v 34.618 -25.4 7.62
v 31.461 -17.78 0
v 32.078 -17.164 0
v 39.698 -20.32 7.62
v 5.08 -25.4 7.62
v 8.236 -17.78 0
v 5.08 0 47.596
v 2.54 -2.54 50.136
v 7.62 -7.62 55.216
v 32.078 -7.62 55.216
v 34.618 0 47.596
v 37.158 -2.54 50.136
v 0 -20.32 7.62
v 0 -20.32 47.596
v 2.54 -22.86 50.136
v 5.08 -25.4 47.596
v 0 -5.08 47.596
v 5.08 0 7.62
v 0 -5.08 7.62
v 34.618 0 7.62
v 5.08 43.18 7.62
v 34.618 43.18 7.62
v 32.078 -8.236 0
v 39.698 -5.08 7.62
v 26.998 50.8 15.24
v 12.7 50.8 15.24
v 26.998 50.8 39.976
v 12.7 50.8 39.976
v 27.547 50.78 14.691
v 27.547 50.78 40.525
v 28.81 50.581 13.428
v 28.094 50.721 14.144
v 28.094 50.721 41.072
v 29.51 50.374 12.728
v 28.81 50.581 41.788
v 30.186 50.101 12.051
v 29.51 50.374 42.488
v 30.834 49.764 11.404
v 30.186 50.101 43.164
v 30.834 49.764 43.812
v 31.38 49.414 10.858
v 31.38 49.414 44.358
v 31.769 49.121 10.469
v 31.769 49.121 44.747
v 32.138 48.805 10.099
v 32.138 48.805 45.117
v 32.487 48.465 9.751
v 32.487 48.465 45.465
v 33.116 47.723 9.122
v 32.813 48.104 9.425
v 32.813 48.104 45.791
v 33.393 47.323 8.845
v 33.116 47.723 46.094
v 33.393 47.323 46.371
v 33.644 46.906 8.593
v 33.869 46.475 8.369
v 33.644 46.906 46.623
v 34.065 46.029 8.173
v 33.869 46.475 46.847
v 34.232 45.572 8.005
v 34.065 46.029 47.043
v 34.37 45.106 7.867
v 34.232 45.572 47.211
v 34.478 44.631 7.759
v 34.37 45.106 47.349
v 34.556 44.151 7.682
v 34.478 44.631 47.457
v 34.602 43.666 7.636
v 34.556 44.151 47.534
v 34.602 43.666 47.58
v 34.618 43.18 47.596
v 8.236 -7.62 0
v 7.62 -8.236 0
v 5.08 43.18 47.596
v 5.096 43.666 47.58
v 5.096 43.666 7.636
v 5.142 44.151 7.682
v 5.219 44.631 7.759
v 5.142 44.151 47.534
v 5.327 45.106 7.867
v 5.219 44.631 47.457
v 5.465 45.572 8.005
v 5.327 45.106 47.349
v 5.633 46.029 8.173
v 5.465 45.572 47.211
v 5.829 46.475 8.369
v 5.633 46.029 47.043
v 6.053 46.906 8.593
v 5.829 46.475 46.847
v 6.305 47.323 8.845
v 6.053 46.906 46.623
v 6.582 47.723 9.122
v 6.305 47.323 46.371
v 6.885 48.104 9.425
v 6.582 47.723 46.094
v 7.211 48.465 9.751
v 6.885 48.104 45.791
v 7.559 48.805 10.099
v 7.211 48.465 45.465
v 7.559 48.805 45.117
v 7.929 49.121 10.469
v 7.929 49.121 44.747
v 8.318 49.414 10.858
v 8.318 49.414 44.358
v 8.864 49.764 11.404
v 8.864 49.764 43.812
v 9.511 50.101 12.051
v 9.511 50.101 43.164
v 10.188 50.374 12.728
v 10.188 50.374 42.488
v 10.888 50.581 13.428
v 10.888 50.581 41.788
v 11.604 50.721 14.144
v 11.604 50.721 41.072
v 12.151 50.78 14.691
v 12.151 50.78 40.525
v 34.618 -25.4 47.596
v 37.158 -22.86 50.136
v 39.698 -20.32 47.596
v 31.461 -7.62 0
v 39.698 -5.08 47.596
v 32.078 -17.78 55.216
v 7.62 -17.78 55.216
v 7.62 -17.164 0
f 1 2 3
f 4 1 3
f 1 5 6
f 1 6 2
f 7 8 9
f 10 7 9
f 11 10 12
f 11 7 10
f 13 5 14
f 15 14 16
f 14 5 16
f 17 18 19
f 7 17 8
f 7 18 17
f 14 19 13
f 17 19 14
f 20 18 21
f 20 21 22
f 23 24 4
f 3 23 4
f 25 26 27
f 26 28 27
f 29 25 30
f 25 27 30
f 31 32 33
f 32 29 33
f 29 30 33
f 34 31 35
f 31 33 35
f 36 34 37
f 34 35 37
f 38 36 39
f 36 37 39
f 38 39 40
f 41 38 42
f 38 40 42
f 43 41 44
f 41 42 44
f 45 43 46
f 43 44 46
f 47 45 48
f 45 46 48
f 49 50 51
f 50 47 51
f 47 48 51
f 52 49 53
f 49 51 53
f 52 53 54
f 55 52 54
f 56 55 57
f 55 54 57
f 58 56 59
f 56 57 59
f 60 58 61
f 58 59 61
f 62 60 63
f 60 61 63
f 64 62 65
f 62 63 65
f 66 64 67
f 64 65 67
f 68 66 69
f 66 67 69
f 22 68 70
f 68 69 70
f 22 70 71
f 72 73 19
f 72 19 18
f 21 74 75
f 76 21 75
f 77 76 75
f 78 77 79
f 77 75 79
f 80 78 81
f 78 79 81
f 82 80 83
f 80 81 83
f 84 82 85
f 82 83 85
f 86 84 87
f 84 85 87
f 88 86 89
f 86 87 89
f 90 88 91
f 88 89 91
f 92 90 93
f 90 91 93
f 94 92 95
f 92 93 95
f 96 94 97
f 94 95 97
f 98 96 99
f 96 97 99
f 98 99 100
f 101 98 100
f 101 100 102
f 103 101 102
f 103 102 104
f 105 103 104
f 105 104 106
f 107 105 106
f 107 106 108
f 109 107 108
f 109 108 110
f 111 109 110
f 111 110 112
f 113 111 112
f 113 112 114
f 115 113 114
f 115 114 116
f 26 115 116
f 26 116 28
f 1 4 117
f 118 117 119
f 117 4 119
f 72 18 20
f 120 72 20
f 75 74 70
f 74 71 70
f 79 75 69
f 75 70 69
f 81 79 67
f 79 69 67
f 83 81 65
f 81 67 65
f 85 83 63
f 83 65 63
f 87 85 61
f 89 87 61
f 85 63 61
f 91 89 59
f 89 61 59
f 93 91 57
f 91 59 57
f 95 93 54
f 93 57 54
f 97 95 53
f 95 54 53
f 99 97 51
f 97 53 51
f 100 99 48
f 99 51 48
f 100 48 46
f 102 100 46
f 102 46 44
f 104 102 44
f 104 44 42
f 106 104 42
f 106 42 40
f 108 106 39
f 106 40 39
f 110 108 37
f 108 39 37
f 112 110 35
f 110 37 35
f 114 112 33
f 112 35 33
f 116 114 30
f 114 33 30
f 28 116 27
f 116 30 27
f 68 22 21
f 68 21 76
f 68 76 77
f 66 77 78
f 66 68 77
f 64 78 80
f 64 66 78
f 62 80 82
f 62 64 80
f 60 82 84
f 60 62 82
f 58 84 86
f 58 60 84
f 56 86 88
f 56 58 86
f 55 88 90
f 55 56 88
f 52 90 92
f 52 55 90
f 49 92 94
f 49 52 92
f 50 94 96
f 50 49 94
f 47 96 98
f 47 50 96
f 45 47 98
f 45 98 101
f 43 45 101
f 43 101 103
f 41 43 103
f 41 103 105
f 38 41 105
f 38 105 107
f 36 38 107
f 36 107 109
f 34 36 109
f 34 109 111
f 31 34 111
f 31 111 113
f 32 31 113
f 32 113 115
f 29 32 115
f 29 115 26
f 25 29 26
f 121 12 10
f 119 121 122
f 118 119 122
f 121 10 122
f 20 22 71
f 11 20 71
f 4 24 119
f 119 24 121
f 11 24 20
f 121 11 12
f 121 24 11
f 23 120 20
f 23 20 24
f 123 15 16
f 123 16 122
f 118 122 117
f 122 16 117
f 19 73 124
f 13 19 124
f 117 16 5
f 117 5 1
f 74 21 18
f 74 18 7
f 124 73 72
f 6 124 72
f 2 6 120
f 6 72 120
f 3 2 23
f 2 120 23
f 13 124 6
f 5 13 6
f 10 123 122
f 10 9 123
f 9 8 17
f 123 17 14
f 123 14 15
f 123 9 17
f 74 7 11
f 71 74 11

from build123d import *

# Parameters (mm, degrees)
F0_W     = 39.6977961063
F0_H     = 55.2159845829
F1_DEPTH = 25.4
F2_SIZE  = 7.62
F3_SIZE  = 5.08
F4_SIZE  = 7.62
F5_DEPTH = 50.8
F6_R     = 7.62


with BuildPart() as f1:
    # F0 (on Front) → F1 (new body)
    with BuildSketch(Plane.XZ):
        with Locations((19.8488980532, 27.6079922915)):
            Rectangle(F0_W, F0_H)
    extrude(amount=F1_DEPTH)

    # F2
    f2_edges = [f1.edges().sort_by_distance(p)[0] for p in [
        (19.848898, -25.4, 55.215985),
        (0, -12.7, 55.215985),
        (39.697796, -12.7, 55.215985),
        (19.848898, 0, 55.215985),
    ]]
    chamfer(f2_edges, length=F2_SIZE)

    # F3
    f3_edges = [f1.edges().sort_by_distance(p)[0] for p in [
        (39.697796, 0, 23.797992),
        (0, -25.4, 23.797992),
        (39.697796, -25.4, 23.797992),
        (0, 0, 23.797992),
    ]]
    chamfer(f3_edges, length=F3_SIZE)

    # F4
    f4_edges = [f1.edges().sort_by_distance(p)[0] for p in [
        (2.54, -2.54, 0),
        (39.697796, -12.7, 0),
        (0, -12.7, 0),
        (2.54, -22.86, 0),
        (19.848898, -25.4, 0),
        (19.848898, 0, 0),
        (37.157796, -2.54, 0),
        (37.157796, -22.86, 0),
    ]]
    chamfer(f4_edges, length=F4_SIZE)

    # F5 (add): a face of the model
    f5_faces = [f1.faces().sort_by_distance(p)[0] for p in [
        (19.8488980532, 0, 27.6079922915),
    ]]
    extrude(f5_faces, amount=F5_DEPTH)

    # F6
    f6_edges = [f1.edges().sort_by_distance(p)[0] for p in [
        (19.848898, 50.8, 7.62),
        (19.848898, 50.8, 47.595985),
        (5.08, 50.8, 27.607992),
        (34.617796, 50.8, 27.607992),
    ]]
    fillet(f6_edges, radius=F6_R)


solid = f1.part
